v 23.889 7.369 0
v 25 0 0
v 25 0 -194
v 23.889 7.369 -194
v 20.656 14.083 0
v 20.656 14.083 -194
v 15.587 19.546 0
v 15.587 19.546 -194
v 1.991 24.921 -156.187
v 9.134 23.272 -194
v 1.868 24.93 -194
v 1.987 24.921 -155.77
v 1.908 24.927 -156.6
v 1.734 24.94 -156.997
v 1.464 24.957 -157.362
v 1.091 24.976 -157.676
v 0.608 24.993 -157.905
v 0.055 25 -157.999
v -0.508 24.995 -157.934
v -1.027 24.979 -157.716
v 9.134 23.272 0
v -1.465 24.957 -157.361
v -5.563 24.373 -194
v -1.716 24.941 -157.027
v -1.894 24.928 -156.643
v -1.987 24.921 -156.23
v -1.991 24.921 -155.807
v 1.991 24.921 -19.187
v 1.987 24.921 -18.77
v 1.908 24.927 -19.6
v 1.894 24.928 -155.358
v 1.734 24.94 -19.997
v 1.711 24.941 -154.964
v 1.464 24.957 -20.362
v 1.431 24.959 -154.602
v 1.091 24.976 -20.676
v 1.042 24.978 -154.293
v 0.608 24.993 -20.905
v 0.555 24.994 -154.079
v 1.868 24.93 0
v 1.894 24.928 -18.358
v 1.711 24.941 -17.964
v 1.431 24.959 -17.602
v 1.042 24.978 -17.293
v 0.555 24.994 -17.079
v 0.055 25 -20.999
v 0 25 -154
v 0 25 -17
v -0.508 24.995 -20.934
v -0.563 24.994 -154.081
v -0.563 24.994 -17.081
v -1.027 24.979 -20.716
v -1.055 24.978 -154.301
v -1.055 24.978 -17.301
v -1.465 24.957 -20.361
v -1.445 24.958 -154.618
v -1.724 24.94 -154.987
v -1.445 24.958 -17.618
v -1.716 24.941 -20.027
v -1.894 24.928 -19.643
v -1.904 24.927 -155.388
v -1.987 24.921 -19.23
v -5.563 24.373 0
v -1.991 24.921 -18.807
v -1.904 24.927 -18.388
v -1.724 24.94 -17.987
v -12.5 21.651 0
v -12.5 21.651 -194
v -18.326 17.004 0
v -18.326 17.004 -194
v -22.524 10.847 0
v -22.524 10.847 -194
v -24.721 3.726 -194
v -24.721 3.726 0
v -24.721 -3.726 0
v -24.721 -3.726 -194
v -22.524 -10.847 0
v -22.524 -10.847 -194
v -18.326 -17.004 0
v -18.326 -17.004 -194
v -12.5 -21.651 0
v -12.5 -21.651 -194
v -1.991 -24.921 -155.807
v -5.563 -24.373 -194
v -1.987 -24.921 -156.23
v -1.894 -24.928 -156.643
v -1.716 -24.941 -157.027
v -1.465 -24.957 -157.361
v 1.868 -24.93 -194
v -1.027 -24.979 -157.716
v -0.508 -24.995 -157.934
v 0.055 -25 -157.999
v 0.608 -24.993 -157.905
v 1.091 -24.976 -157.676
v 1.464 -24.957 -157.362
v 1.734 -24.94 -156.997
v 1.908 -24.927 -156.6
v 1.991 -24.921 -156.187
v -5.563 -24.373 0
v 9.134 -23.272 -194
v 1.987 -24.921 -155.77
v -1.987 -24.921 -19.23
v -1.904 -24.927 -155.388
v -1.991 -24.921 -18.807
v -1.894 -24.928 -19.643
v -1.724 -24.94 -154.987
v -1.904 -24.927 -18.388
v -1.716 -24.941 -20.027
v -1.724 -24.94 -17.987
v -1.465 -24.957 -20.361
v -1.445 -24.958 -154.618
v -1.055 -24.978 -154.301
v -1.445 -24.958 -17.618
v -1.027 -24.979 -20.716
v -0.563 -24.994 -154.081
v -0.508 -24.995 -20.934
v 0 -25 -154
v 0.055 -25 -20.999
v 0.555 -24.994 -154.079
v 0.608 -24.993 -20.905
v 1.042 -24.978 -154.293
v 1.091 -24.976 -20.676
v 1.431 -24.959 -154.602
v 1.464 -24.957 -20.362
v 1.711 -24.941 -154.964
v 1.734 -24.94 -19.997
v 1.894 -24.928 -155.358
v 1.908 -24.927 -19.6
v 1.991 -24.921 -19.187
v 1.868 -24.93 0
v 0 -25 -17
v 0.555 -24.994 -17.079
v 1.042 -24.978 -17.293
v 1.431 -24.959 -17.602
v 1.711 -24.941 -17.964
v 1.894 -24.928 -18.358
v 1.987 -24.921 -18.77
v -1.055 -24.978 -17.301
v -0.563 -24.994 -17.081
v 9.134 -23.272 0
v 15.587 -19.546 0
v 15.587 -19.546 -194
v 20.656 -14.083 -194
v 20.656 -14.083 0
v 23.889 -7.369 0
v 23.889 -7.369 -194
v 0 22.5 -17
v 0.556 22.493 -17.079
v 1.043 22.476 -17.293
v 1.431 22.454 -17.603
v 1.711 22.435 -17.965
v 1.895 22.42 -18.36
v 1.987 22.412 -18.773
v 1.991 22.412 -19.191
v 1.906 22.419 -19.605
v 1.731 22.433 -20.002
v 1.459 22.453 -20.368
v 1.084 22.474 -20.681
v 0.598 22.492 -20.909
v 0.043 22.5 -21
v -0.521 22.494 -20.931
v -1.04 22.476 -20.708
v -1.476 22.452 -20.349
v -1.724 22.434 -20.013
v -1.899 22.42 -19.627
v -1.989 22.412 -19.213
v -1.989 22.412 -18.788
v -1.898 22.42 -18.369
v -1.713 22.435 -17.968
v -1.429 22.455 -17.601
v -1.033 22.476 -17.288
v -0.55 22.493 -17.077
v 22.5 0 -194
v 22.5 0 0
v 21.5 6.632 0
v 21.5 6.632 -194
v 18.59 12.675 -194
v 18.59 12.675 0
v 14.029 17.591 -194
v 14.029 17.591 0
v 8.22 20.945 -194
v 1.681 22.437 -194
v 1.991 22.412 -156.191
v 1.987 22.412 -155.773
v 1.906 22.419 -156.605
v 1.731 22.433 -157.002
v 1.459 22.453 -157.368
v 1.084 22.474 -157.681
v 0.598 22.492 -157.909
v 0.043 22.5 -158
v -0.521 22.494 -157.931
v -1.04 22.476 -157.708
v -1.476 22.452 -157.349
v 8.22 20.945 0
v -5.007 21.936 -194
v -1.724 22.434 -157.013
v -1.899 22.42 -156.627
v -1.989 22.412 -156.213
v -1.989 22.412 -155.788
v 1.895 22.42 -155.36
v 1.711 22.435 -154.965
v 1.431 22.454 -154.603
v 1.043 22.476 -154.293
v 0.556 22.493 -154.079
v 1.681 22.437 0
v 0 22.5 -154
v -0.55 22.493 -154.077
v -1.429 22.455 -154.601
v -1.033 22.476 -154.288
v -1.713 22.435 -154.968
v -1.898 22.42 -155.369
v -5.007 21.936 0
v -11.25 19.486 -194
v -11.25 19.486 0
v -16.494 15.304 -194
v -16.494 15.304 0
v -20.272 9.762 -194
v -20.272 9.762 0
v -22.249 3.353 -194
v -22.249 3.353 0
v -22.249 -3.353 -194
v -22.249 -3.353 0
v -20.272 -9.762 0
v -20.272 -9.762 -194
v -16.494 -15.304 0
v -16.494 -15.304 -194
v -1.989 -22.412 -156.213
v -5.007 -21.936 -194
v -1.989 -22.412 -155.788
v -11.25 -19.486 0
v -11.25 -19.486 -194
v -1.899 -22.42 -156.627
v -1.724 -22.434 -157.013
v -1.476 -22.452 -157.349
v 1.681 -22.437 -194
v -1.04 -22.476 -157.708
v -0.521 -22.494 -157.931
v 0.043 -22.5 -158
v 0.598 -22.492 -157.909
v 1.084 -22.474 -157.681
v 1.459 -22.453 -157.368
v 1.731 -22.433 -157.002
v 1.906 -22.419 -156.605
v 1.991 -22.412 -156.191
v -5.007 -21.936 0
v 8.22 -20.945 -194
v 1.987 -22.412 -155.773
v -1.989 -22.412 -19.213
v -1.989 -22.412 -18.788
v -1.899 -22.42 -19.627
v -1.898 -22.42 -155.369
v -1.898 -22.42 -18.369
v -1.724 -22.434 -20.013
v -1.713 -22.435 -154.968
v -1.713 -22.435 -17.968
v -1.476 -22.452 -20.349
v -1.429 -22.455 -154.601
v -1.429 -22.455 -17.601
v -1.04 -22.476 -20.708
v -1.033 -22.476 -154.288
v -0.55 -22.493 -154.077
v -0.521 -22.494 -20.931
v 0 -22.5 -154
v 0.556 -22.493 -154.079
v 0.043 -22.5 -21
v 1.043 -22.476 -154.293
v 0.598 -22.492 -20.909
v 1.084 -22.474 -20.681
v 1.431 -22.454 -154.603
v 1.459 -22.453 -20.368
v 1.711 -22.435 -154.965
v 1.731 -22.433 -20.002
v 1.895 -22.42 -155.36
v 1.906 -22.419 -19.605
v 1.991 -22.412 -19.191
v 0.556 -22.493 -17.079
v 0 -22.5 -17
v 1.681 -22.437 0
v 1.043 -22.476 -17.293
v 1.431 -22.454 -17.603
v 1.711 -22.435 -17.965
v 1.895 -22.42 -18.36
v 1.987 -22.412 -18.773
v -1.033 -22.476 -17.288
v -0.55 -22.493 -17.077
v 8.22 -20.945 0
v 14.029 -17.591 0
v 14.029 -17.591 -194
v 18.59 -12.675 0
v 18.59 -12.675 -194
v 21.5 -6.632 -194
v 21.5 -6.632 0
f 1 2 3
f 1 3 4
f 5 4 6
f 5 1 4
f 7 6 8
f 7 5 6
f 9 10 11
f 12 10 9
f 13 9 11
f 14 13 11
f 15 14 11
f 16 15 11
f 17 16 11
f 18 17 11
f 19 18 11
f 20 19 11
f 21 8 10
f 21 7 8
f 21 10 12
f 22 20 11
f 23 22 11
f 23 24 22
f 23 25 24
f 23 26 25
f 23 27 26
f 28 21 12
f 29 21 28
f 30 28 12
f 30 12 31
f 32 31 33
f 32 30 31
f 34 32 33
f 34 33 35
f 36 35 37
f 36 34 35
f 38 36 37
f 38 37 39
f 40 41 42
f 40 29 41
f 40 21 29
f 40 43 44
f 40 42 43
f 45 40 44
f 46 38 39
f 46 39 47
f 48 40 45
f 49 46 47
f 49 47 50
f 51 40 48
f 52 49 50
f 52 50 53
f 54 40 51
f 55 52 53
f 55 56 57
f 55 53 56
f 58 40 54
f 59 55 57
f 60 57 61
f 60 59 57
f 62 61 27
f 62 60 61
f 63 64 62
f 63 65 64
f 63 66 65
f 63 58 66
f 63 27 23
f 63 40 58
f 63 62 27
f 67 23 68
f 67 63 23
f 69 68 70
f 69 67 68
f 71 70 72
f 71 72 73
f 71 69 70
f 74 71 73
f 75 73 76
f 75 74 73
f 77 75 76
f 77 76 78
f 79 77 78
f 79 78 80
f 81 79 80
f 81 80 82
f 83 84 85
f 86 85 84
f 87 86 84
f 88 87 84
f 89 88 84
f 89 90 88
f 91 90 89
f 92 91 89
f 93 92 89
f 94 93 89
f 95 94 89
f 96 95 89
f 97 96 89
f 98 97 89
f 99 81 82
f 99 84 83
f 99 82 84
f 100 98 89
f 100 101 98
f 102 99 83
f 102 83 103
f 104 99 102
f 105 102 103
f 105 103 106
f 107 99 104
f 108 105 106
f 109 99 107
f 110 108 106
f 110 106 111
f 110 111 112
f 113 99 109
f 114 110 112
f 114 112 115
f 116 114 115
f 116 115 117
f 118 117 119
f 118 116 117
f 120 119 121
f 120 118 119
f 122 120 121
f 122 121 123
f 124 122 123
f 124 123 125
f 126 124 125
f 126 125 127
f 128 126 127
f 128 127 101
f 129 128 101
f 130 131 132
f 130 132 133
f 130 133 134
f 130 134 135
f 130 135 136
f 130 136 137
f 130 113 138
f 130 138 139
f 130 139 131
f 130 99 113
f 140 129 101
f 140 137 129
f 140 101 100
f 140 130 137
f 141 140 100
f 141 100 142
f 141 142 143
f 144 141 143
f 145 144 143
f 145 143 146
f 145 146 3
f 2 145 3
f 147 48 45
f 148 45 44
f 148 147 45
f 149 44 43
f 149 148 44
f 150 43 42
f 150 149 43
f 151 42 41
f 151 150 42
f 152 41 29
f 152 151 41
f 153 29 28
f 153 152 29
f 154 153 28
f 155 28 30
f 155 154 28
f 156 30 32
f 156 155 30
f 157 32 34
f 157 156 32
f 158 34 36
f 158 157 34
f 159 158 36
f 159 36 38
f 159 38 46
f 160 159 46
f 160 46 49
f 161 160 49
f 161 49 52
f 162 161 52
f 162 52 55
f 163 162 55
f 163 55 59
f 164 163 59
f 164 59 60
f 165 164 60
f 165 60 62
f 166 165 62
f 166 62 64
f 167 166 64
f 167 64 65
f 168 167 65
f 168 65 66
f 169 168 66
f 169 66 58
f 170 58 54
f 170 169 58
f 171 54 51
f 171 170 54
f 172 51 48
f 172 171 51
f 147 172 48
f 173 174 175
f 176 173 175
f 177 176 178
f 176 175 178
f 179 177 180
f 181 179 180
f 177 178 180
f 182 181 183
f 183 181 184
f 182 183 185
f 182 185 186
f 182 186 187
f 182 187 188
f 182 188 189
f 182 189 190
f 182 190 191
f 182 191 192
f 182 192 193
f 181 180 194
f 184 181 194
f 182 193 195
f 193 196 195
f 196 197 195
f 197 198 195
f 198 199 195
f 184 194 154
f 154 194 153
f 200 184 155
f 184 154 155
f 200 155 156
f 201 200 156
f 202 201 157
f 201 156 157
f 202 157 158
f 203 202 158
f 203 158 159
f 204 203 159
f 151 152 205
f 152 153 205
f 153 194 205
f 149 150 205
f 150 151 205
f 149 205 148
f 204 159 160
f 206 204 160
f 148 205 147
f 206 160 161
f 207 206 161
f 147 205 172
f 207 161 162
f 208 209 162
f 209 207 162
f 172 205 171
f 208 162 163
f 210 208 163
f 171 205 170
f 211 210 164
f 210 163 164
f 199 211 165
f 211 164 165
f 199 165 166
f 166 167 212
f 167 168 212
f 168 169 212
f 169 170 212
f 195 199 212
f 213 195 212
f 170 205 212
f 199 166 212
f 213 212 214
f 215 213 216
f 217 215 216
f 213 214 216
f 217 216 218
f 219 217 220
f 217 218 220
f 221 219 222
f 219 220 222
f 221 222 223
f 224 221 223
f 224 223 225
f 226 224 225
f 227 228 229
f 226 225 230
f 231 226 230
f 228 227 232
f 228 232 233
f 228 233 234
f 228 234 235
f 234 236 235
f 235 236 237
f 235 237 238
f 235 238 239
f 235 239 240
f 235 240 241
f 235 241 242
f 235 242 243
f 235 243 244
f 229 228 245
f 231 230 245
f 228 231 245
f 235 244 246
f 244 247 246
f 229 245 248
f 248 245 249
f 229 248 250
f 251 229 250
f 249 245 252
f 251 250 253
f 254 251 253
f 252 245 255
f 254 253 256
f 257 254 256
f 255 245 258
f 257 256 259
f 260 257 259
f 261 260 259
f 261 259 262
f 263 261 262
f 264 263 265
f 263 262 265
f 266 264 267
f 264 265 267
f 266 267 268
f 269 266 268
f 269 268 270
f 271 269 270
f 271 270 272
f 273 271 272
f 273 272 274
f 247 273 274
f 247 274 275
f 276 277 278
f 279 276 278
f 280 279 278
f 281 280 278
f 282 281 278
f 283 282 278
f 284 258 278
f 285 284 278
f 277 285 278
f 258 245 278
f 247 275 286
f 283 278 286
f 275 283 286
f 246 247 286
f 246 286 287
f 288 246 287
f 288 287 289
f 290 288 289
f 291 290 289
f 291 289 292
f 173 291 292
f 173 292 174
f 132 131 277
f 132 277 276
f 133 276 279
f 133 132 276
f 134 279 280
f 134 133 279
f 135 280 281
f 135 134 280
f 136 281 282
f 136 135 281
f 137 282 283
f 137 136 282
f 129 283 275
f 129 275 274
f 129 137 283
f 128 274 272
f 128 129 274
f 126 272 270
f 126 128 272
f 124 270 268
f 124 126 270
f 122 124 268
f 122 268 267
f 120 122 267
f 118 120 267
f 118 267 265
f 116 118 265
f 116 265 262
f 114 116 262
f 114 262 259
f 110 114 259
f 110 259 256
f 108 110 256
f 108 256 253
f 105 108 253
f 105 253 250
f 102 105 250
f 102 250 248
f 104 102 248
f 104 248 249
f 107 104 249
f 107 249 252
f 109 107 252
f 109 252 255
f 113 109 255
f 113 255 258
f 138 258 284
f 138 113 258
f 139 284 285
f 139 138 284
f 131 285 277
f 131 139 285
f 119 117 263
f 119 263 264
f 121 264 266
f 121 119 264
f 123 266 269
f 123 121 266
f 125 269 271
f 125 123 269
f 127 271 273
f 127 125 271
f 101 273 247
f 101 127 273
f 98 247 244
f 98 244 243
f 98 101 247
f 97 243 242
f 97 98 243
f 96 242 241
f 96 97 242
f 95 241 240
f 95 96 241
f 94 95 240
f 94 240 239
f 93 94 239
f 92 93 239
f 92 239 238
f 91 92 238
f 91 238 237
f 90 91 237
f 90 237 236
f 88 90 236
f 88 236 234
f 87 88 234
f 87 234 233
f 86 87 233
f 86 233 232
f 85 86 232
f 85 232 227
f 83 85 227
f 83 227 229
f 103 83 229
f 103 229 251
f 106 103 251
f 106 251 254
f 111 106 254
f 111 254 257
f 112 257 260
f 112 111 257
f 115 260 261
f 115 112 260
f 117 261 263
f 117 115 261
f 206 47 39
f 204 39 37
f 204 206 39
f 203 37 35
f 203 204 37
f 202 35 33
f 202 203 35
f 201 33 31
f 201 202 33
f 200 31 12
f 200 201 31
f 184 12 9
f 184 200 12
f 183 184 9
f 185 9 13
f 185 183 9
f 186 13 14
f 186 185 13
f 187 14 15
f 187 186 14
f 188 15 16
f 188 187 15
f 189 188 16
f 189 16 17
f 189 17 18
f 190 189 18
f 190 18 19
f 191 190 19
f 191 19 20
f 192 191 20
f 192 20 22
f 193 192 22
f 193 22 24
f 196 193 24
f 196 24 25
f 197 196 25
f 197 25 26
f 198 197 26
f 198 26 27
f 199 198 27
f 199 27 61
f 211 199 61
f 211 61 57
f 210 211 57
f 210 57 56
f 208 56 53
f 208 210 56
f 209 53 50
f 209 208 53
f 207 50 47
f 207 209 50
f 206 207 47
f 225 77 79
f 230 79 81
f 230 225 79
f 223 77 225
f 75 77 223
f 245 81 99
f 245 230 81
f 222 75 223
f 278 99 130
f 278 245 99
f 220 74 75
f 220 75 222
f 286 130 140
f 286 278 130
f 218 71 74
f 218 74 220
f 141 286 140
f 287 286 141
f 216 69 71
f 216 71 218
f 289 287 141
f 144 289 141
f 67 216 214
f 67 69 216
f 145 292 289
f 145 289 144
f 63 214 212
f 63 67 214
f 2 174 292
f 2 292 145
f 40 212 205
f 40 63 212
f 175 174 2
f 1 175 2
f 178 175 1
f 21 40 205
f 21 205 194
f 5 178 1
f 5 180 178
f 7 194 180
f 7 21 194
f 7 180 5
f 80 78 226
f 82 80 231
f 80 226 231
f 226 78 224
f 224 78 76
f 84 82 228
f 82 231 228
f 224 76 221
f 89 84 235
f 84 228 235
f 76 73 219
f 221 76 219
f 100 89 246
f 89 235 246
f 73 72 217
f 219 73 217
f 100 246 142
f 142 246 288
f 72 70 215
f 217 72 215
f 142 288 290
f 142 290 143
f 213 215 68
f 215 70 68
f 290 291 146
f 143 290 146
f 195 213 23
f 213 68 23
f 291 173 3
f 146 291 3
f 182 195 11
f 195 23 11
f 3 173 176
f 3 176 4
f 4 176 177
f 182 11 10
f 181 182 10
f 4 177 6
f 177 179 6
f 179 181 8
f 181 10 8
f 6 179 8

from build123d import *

# Parameters (mm, degrees)
SKETCH1_R               = 25
SKETCH1_R_2             = 22.5
BOSS_EXTRUDE1_DEPTH     = 194
CUT_EXTRUDE1_DEPTH      = 198.19533463
CUT_EXTRUDE1_DEPTH_BACK = 198.19533463
SKETCH10_R              = 2


with BuildPart() as part:
    # Sketch1 → Boss-Extrude1 (new body)
    with BuildSketch(Plane.XY):
        Circle(SKETCH1_R)
        Circle(SKETCH1_R_2, mode=Mode.SUBTRACT)
    extrude(amount=-BOSS_EXTRUDE1_DEPTH)

    # Sketch10 → Cut-Extrude1 (cut, two sides: drawn at the far end of the back side and taken through both)
    with BuildSketch(Plane(origin=(0, 0, 0), x_dir=(1, 0, 0), z_dir=(0, 1, 0)).offset(-CUT_EXTRUDE1_DEPTH_BACK)):
        with Locations(Location((0, 156, 0), (0, 0, 270))):
            Circle(SKETCH10_R)
        with Locations(Location((0, 19, 0), (0, 0, 270))):
            Circle(SKETCH10_R)
    extrude(amount=CUT_EXTRUDE1_DEPTH + CUT_EXTRUDE1_DEPTH_BACK, mode=Mode.SUBTRACT)


solid = part.part
